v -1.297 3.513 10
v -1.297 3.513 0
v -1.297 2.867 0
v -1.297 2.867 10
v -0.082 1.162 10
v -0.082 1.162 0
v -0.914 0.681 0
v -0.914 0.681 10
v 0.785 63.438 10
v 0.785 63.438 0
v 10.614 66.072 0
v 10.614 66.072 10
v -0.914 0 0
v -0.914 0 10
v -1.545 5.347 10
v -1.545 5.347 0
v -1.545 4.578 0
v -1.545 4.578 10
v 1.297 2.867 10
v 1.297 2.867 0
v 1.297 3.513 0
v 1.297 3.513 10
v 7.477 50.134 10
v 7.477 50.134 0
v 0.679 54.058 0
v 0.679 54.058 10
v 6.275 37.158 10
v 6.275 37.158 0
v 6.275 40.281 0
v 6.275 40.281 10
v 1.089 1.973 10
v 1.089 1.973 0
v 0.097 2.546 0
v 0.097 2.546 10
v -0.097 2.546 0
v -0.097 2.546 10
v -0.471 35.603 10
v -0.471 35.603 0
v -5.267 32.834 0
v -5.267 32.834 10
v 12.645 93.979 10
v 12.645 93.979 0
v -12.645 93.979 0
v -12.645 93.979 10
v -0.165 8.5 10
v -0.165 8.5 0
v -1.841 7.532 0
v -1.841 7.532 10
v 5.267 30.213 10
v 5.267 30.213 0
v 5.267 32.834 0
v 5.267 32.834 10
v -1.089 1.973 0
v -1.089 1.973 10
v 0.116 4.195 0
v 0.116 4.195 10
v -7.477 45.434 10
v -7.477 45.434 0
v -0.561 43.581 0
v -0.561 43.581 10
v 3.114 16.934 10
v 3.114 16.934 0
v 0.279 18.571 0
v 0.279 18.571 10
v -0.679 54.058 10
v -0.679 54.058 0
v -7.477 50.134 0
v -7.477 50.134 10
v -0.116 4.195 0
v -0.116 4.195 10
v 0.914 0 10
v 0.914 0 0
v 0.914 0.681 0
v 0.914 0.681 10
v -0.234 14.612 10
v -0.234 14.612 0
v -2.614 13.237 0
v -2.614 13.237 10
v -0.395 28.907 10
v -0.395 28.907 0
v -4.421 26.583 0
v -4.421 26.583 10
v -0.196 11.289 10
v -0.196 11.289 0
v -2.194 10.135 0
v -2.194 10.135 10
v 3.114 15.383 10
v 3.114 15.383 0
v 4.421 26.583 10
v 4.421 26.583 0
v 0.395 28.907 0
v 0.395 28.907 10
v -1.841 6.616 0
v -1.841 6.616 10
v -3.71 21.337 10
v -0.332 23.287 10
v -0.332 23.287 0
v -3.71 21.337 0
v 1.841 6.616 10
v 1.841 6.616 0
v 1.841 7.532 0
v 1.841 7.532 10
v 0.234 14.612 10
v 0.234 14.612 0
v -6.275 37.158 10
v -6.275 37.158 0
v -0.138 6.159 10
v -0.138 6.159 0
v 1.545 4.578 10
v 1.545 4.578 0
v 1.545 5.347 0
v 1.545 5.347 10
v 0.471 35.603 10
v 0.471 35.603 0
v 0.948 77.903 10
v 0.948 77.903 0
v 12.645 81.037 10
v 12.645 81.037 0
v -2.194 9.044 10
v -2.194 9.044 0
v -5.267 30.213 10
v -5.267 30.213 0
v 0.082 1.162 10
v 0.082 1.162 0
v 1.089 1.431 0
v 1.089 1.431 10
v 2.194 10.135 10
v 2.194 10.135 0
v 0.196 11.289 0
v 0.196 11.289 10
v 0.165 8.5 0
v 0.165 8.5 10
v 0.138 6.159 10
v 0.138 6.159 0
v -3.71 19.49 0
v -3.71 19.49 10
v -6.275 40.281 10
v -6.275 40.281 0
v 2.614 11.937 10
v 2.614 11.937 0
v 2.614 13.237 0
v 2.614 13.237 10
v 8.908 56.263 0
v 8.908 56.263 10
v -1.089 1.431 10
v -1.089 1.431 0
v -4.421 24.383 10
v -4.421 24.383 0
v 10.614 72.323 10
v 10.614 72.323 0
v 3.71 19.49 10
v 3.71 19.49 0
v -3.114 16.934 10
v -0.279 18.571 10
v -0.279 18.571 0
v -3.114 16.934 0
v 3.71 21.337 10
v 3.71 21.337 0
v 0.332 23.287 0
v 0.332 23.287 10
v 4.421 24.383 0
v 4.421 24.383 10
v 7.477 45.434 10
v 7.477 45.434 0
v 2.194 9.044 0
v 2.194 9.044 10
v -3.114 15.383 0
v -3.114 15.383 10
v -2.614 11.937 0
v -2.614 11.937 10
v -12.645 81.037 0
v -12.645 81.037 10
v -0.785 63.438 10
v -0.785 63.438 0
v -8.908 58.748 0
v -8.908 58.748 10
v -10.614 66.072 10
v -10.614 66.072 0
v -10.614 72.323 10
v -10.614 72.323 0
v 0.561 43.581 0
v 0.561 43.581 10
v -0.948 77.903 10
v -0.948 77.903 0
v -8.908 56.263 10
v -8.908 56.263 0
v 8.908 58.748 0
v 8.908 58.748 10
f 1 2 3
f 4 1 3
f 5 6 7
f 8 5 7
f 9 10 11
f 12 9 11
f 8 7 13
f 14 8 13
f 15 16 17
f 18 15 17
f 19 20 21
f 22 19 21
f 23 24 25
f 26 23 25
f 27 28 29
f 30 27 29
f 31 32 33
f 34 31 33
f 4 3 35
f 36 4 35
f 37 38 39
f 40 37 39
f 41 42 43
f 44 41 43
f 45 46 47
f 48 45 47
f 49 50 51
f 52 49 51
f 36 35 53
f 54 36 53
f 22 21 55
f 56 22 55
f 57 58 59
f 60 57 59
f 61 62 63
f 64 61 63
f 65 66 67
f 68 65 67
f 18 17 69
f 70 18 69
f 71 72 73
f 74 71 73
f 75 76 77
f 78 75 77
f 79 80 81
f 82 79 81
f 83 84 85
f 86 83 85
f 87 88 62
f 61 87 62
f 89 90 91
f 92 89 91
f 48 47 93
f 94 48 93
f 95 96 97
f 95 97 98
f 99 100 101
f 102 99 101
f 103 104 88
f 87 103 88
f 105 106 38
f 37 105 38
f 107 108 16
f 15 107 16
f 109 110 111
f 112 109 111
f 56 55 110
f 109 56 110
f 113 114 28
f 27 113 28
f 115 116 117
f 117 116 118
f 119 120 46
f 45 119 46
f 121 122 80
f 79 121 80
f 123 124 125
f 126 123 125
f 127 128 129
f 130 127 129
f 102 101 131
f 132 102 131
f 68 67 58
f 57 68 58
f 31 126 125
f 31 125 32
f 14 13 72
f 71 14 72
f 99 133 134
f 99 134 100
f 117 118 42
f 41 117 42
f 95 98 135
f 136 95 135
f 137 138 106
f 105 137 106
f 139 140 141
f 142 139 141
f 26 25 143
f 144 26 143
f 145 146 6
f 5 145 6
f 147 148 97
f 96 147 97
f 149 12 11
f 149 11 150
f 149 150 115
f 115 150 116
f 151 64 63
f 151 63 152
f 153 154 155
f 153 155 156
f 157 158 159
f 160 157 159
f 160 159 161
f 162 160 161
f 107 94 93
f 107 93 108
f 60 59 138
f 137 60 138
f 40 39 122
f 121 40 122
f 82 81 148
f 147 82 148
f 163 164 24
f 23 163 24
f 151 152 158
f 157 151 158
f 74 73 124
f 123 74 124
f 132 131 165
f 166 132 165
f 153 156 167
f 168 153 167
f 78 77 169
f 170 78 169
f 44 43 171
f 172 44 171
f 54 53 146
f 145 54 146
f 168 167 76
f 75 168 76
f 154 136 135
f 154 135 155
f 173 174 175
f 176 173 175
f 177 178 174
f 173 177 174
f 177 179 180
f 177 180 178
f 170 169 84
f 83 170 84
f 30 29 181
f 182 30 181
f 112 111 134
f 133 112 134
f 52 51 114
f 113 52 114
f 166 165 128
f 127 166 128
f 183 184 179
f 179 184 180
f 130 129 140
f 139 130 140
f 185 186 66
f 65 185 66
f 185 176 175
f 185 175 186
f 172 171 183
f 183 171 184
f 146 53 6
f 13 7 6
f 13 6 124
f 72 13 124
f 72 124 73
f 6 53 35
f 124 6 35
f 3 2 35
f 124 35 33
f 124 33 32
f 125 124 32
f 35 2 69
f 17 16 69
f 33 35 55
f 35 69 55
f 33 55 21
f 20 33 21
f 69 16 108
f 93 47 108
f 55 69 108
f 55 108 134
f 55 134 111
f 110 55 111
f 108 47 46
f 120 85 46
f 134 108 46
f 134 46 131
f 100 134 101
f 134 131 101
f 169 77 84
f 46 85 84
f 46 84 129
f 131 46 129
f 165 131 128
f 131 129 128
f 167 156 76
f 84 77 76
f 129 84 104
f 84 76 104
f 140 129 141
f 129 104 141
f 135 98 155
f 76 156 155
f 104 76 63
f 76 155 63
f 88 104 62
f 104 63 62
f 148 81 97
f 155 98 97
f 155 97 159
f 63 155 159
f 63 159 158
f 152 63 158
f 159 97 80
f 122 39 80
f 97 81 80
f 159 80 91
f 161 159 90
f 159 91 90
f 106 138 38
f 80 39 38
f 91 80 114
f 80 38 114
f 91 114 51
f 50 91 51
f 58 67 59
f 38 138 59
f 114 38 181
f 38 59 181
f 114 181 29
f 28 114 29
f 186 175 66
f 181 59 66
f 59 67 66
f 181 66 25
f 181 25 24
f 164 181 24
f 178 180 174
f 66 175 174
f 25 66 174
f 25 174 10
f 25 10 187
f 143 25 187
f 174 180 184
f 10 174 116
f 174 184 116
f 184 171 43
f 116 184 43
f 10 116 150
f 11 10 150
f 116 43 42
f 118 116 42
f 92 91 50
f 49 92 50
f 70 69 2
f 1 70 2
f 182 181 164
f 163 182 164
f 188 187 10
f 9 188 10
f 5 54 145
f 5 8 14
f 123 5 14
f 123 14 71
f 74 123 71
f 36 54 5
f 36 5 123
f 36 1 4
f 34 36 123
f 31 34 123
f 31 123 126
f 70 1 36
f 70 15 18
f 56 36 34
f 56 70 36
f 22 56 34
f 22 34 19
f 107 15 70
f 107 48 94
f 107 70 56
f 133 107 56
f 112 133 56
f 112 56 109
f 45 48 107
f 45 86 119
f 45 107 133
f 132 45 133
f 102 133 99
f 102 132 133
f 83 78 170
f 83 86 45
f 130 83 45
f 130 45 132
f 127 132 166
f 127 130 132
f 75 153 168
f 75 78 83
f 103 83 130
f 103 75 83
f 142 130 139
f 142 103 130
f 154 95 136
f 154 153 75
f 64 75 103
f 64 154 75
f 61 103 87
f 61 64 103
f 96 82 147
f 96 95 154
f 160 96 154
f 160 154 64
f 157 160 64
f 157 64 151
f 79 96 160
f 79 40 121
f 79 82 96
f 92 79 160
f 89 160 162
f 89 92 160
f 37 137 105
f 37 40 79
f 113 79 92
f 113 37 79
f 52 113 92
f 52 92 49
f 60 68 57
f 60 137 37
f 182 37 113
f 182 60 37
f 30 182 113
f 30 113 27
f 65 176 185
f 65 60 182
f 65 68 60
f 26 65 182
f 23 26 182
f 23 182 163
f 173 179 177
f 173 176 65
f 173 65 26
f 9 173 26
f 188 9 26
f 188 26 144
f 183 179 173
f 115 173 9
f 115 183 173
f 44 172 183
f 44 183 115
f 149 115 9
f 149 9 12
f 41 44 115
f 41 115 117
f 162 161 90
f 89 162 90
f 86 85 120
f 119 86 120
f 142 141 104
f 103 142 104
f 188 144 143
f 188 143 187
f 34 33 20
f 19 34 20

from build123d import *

# Parameters (mm, degrees)
BOSS_EXTRUDE1_DEPTH = 10


with BuildPart() as part:
    # spiral_flat → Boss-Extrude1 (new body)
    with BuildSketch(Plane.XY):
        with BuildLine():
            Line((0, 93.978977978), (-12.645458185, 93.978977978))
            Line((-12.645458185, 93.978977978), (-12.645458185, 81.037355698))
            Line((-12.645458185, 81.037355698), (-0.948409364, 77.903140912))
            Line((-0.948409364, 77.903140912), (-10.613540319, 72.322974954))
            Line((-10.613540319, 72.322974954), (-10.613540319, 66.071506497))
            Line((-10.613540319, 66.071506497), (-0.785032027, 63.437965637))
            Line((-0.785032027, 63.437965637), (-8.90811835, 58.748099562))
            Line((-8.90811835, 58.748099562), (-8.90811835, 56.263194352))
            Line((-8.90811835, 56.263194352), (-0.679092373, 54.058233487))
            Line((-0.679092373, 54.058233487), (-7.476729738, 50.133615724))
            Line((-7.476729738, 50.133615724), (-7.476729738, 45.433932588))
            Line((-7.476729738, 45.433932588), (-0.56075473, 43.58080267))
            Line((-0.56075473, 43.58080267), (-6.275341816, 40.281484278))
            Line((-6.275341816, 40.281484278), (-6.275341816, 37.158488644))
            Line((-6.275341816, 37.158488644), (-0.470650636, 35.603126331))
            Line((-0.470650636, 35.603126331), (-5.266997241, 32.833954327))
            Line((-5.266997241, 32.833954327), (-5.266997241, 30.212772905))
            Line((-5.266997241, 30.212772905), (-0.395024793, 28.907331822))
            Line((-0.395024793, 28.907331822), (-4.420677113, 26.583120371))
            Line((-4.420677113, 26.583120371), (-4.420677113, 24.383079269))
            Line((-4.420677113, 24.383079269), (-0.331702205, 23.287441744))
            Line((-0.331702205, 23.287441744), (-3.710346757, 21.336780402))
            Line((-3.710346757, 21.336780402), (-3.710346757, 19.490083441))
            Line((-3.710346757, 19.490083441), (-0.278697859, 18.57057589))
            Line((-0.278697859, 18.57057589), (-3.114154847, 16.933524034))
            Line((-3.114154847, 16.933524034), (-3.114154847, 15.383475192))
            Line((-3.114154847, 15.383475192), (-0.233600822, 14.611633067))
            Line((-0.233600822, 14.611633067), (-2.613761206, 13.237446829))
            Line((-2.613761206, 13.237446829), (-2.613761206, 11.936656031))
            Line((-2.613761206, 11.936656031), (-0.19603209, 11.288827467))
            Line((-0.19603209, 11.288827467), (-2.19377262, 10.135431435))
            Line((-2.19377262, 10.135431435), (-2.19377262, 9.043614273))
            Line((-2.19377262, 9.043614273), (-0.164761066, 8.499942265))
            Line((-0.164761066, 8.499942265), (-1.841269317, 7.532009775))
            Line((-1.841269317, 7.532009775), (-1.841269317, 6.615509703))
            Line((-1.841269317, 6.615509703), (-0.138243102, 6.159185204))
            Line((-0.138243102, 6.159185204), (-1.545407517, 5.346758451))
            Line((-1.545407517, 5.346758451), (-1.545407517, 4.577583331))
            Line((-1.545407517, 4.577583331), (-0.115905564, 4.194549437))
            Line((-0.115905564, 4.194549437), (-1.297085859, 3.512594676))
            Line((-1.297085859, 3.512594676), (-1.297085859, 2.867070252))
            Line((-1.297085859, 2.867070252), (-0.097336711, 2.545598437))
            Line((-0.097336711, 2.545598437), (-1.088665421, 1.973254539))
            Line((-1.088665421, 1.973254539), (-1.088665421, 1.431435829))
            Line((-1.088665421, 1.431435829), (-0.081649907, 1.161606835))
            Line((-0.081649907, 1.161606835), (-0.913734731, 0.681202438))
            Line((-0.913734731, 0.681202438), (-0.913734731, 0))
            Line((-0.913734731, 0), (0, 0))
            add(Edge.make_bspline(
                [(0, 0), (0, 0.387202278), (0, 1.235735091), (0, 2.633918237), (0, 4.299777693), (0, 6.284558969), (0, 8.649318312), (0, 11.466800933), (0, 14.823678808), (0, 18.8232169), (0, 23.588449819), (0, 29.265966632), (0, 36.030420274), (0, 44.414054162), (0, 53.692333931), (0, 65.133113345), (0, 78.440028176), (0, 88.620365623), (0, 93.978977978)],
                knots=[0, 0, 0, 0, 0.012360284, 0.027086892, 0.044632848, 0.065537904, 0.090445145, 0.120120773, 0.155477676, 0.19760351, 0.247794158, 0.307593596, 0.378841387, 0.463729268, 0.575216231, 0.675022936, 0.828942202, 1, 1, 1, 1], degree=3))
        make_face()
        with BuildLine():
            Line((12.645458185, 93.978977978), (0, 93.978977978))
            add(Edge.make_bspline(
                [(0, 0), (0, 0.387202278), (0, 1.235735091), (0, 2.633918237), (0, 4.299777693), (0, 6.284558969), (0, 8.649318312), (0, 11.466800933), (0, 14.823678808), (0, 18.8232169), (0, 23.588449819), (0, 29.265966632), (0, 36.030420274), (0, 44.414054162), (0, 53.692333931), (0, 65.133113345), (0, 78.440028176), (0, 88.620365623), (0, 93.978977978)],
                knots=[0, 0, 0, 0, 0.012360284, 0.027086892, 0.044632848, 0.065537904, 0.090445145, 0.120120773, 0.155477676, 0.19760351, 0.247794158, 0.307593596, 0.378841387, 0.463729268, 0.575216231, 0.675022936, 0.828942202, 1, 1, 1, 1], degree=3))
            Line((0, 0), (0.913734731, 0))
            Line((0.913734731, 0), (0.913734731, 0.681202438))
            Line((0.913734731, 0.681202438), (0.081649907, 1.161606835))
            Line((0.081649907, 1.161606835), (1.088665421, 1.431435829))
            Line((1.088665421, 1.431435829), (1.088665421, 1.973254539))
            Line((1.088665421, 1.973254539), (0.097336711, 2.545598437))
            Line((0.097336711, 2.545598437), (1.297085859, 2.867070252))
            Line((1.297085859, 2.867070252), (1.297085859, 3.512594676))
            Line((1.297085859, 3.512594676), (0.115905564, 4.194549437))
            Line((0.115905564, 4.194549437), (1.545407517, 4.577583331))
            Line((1.545407517, 4.577583331), (1.545407517, 5.346758451))
            Line((1.545407517, 5.346758451), (0.138243102, 6.159185204))
            Line((0.138243102, 6.159185204), (1.841269317, 6.615509703))
            Line((1.841269317, 6.615509703), (1.841269317, 7.532009775))
            Line((1.841269317, 7.532009775), (0.164761066, 8.499942265))
            Line((0.164761066, 8.499942265), (2.19377262, 9.043614273))
            Line((2.19377262, 9.043614273), (2.19377262, 10.135431435))
            Line((2.19377262, 10.135431435), (0.19603209, 11.288827467))
            Line((0.19603209, 11.288827467), (2.613761206, 11.936656031))
            Line((2.613761206, 11.936656031), (2.613761206, 13.237446829))
            Line((2.613761206, 13.237446829), (0.233600822, 14.611633067))
            Line((0.233600822, 14.611633067), (3.114154847, 15.383475192))
            Line((3.114154847, 15.383475192), (3.114154847, 16.933524034))
            Line((3.114154847, 16.933524034), (0.278697859, 18.57057589))
            Line((0.278697859, 18.57057589), (3.710346757, 19.490083441))
            Line((3.710346757, 19.490083441), (3.710346757, 21.336780402))
            Line((3.710346757, 21.336780402), (0.331702205, 23.287441744))
            Line((0.331702205, 23.287441744), (4.420677113, 24.383079269))
            Line((4.420677113, 24.383079269), (4.420677113, 26.583120371))
            Line((4.420677113, 26.583120371), (0.395024793, 28.907331822))
            Line((0.395024793, 28.907331822), (5.266997241, 30.212772905))
            Line((5.266997241, 30.212772905), (5.266997241, 32.833954327))
            Line((5.266997241, 32.833954327), (0.470650636, 35.603126331))
            Line((0.470650636, 35.603126331), (6.275341816, 37.158488644))
            Line((6.275341816, 37.158488644), (6.275341816, 40.281484278))
            Line((6.275341816, 40.281484278), (0.56075473, 43.58080267))
            Line((0.56075473, 43.58080267), (7.476729738, 45.433932588))
            Line((7.476729738, 45.433932588), (7.476729738, 50.133615724))
            Line((7.476729738, 50.133615724), (0.679092373, 54.058233487))
            Line((0.679092373, 54.058233487), (8.90811835, 56.263194352))
            Line((8.90811835, 56.263194352), (8.90811835, 58.748099562))
            Line((8.90811835, 58.748099562), (0.785032027, 63.437965637))
            Line((0.785032027, 63.437965637), (10.613540319, 66.071506497))
            Line((10.613540319, 66.071506497), (10.613540319, 72.322974954))
            Line((10.613540319, 72.322974954), (0.948409364, 77.903140912))
            Line((0.948409364, 77.903140912), (12.645458185, 81.037355698))
            Line((12.645458185, 81.037355698), (12.645458185, 93.978977978))
        make_face()
    extrude(amount=BOSS_EXTRUDE1_DEPTH)


solid = part.part
